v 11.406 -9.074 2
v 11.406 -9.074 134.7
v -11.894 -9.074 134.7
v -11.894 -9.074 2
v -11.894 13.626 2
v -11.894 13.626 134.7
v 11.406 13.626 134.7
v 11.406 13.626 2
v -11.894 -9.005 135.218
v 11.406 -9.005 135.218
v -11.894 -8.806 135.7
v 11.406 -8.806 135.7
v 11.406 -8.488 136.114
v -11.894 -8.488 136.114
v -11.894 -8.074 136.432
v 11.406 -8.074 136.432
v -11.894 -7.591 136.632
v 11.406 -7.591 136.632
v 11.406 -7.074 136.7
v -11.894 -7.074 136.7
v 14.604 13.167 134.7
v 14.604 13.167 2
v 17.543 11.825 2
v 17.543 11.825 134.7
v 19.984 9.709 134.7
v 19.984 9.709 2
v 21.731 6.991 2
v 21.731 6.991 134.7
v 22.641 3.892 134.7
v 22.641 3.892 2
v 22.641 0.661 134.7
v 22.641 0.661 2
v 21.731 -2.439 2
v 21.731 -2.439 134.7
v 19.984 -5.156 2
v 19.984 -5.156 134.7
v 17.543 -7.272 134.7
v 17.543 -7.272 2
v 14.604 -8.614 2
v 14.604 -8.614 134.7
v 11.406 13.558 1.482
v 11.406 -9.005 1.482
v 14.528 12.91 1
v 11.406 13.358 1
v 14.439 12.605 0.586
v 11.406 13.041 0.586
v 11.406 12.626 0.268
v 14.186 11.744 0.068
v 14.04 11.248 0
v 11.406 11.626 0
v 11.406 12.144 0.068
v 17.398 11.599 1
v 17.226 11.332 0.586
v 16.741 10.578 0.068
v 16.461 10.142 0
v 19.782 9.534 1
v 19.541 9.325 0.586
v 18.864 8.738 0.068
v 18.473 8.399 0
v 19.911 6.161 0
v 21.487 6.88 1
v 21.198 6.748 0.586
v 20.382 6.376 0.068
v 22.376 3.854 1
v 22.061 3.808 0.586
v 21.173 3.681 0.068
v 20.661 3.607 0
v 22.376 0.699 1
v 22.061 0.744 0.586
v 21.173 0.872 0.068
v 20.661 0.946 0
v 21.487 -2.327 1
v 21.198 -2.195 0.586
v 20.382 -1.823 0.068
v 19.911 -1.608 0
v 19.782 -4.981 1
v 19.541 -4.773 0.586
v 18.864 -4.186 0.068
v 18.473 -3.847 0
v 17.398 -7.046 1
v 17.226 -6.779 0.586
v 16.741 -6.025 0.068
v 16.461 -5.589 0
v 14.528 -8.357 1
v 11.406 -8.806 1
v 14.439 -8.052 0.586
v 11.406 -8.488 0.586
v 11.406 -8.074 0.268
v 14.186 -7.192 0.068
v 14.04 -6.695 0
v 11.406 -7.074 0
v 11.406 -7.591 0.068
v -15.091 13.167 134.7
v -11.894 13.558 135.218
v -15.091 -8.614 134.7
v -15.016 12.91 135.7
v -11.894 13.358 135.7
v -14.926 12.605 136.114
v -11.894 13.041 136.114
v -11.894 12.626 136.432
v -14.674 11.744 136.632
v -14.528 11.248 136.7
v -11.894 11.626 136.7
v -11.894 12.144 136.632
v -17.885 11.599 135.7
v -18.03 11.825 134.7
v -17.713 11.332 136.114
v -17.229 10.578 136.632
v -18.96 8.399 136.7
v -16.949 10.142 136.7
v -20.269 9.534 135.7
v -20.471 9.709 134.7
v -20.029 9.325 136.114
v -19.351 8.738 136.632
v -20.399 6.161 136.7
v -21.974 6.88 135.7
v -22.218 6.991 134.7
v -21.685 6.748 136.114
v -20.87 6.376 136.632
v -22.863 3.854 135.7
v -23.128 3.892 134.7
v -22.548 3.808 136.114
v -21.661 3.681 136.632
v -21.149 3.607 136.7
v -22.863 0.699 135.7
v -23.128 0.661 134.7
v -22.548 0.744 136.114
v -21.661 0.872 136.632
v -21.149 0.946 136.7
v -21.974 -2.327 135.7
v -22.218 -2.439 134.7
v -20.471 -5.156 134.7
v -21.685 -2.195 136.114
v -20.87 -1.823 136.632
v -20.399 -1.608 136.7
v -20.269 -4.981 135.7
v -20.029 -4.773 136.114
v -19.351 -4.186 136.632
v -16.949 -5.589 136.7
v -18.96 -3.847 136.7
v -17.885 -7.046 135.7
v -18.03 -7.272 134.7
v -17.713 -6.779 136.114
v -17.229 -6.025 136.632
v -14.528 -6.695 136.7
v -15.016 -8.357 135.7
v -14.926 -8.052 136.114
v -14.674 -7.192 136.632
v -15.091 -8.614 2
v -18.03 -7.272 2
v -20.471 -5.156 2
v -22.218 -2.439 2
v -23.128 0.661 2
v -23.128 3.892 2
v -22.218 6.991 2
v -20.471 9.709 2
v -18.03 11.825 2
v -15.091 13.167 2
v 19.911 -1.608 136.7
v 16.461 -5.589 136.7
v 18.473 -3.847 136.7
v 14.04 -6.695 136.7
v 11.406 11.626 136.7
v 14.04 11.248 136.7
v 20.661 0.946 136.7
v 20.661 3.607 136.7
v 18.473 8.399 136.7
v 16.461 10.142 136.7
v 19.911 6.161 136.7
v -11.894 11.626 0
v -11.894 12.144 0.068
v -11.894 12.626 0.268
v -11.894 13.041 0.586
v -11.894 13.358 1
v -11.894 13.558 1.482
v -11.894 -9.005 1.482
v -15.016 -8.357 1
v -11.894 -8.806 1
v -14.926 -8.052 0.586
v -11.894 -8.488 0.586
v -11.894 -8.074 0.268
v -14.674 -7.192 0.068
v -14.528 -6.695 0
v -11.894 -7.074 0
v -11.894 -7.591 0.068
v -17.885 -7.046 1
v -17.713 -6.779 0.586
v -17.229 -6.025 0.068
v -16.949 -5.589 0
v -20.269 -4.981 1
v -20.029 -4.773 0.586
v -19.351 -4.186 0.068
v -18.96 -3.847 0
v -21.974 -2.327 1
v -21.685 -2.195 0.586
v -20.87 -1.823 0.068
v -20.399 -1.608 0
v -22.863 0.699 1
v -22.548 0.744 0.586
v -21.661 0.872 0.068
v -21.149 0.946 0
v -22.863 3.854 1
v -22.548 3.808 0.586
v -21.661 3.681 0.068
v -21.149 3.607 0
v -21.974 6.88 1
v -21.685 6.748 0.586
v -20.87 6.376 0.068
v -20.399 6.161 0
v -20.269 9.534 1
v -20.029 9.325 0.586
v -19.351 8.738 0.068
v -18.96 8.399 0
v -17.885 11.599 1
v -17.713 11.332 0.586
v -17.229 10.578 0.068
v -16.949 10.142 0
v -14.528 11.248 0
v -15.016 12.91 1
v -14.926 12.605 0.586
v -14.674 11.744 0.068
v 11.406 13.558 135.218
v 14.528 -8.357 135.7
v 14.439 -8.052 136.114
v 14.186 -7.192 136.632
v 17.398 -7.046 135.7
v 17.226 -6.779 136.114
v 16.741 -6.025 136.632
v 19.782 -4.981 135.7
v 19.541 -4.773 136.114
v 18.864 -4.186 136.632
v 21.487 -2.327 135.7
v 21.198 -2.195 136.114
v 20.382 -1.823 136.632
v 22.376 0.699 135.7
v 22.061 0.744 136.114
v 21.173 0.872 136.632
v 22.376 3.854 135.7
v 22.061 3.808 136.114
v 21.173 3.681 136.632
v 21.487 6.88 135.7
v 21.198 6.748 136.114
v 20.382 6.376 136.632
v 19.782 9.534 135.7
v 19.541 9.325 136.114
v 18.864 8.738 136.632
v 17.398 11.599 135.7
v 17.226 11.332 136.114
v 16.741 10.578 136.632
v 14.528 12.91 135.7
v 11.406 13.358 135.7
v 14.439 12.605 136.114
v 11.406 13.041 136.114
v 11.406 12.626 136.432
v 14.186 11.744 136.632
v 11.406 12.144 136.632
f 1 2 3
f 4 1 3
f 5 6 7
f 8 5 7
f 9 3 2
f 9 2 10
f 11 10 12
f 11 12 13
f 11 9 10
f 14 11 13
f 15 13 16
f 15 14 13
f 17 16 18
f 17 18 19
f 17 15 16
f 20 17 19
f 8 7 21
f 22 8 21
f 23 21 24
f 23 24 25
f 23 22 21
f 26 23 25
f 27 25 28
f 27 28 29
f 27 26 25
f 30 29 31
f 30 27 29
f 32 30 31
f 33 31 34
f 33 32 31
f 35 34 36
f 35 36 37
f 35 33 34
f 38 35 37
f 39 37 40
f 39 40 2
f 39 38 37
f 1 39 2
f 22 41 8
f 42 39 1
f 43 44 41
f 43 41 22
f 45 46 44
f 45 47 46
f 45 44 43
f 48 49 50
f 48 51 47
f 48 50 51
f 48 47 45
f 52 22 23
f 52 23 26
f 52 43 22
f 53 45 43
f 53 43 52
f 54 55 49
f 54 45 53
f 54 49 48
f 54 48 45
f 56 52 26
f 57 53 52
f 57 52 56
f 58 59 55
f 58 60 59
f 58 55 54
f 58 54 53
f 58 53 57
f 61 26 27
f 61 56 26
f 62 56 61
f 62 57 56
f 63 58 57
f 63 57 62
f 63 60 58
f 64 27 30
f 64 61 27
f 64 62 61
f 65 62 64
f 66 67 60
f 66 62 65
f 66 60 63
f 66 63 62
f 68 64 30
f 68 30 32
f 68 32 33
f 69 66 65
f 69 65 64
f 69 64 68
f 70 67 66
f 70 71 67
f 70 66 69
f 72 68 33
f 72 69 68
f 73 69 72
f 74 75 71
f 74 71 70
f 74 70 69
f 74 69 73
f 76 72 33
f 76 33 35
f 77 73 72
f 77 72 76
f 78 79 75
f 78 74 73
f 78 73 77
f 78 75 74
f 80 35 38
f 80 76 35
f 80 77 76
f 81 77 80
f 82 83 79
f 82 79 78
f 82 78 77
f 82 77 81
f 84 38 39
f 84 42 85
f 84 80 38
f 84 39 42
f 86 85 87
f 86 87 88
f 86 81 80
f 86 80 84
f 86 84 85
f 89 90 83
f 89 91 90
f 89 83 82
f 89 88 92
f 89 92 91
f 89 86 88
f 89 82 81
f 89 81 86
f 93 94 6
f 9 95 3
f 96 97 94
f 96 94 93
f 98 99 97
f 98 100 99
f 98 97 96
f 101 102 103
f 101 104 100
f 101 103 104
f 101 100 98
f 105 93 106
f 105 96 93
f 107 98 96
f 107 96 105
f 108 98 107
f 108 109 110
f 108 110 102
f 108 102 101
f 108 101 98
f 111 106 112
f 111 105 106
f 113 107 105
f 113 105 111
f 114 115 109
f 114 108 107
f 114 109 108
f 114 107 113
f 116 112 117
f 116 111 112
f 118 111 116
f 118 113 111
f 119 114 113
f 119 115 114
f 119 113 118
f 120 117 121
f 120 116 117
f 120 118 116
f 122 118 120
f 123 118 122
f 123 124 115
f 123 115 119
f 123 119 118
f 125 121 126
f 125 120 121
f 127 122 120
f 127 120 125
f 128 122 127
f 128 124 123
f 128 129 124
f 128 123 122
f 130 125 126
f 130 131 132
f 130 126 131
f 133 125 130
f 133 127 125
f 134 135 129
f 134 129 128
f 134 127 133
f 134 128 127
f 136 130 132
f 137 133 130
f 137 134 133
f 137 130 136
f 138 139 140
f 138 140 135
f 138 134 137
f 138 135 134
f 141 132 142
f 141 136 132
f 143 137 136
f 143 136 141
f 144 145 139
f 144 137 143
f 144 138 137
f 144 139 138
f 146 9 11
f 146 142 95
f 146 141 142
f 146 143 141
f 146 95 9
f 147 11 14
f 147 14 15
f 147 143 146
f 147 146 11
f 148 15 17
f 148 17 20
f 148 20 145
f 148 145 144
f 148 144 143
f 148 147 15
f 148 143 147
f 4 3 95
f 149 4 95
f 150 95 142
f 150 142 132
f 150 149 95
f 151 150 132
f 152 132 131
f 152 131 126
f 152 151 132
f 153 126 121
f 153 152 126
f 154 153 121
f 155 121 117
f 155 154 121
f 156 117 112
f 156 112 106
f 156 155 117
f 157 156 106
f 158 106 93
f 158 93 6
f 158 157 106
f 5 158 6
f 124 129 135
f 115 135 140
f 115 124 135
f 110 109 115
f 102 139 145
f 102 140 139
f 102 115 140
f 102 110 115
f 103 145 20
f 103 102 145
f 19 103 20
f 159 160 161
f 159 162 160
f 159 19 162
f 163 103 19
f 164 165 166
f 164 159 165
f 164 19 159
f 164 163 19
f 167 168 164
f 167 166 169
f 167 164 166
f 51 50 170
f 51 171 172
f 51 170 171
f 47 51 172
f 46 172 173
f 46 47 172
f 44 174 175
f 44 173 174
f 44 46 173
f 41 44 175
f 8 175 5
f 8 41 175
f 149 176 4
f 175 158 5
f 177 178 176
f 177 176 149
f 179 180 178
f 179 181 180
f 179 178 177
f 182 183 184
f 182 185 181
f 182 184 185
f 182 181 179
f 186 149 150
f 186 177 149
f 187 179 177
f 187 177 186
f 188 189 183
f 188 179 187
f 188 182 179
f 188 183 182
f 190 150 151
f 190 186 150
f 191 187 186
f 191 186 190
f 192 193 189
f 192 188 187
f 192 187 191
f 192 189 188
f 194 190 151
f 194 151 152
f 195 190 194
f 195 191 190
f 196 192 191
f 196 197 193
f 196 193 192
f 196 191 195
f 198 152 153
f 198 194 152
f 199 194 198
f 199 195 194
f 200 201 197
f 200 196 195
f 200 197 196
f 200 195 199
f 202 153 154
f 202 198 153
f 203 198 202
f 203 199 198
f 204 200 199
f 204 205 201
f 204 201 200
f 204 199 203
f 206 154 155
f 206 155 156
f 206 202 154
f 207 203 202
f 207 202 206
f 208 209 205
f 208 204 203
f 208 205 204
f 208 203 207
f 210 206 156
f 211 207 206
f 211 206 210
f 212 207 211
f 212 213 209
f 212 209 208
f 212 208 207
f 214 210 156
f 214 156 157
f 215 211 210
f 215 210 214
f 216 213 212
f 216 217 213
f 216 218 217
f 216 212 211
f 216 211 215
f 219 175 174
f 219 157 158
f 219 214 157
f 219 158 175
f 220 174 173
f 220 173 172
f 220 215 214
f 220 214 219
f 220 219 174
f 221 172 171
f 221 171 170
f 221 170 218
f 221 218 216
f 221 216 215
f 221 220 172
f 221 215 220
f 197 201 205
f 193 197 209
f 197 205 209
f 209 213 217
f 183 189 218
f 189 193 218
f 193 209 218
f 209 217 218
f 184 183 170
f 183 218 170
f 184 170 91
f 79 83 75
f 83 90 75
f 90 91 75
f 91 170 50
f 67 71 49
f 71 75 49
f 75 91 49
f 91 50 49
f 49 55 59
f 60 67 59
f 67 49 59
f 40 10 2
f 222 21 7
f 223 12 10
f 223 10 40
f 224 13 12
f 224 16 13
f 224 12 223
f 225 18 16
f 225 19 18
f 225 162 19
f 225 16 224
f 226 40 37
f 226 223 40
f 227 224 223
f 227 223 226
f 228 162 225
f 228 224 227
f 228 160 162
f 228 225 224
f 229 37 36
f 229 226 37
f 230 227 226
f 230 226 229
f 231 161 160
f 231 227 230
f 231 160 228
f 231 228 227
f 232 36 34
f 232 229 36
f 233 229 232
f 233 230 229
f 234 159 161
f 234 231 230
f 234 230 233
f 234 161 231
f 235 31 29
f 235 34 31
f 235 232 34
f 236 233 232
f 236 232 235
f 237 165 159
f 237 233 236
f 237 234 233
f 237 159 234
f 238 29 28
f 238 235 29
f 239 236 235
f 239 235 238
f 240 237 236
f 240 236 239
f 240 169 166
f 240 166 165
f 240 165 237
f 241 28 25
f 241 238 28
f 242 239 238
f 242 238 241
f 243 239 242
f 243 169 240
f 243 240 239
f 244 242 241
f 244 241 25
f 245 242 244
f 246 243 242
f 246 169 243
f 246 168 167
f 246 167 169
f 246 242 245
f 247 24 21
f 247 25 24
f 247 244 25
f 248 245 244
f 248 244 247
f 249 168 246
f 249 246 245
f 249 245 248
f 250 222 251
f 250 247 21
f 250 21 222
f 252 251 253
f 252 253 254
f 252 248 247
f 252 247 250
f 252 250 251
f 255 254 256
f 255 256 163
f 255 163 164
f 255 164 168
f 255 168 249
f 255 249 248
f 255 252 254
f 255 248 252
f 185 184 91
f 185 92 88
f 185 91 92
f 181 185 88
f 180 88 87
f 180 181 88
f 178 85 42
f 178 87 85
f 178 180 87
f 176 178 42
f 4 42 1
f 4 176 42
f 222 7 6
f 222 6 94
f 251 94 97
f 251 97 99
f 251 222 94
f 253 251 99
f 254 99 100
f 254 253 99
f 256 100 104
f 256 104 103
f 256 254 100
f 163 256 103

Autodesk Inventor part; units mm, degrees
ref_plane "YZ Plane" through (0, 0, 0) normal (1, 0, 0) x (0, 1, 0)
ref_plane "XZ Plane" through (0, 0, 0) normal (0, 1, 0) x (-1, 0, 0)
ref_plane "XY Plane" through (0, 0, 0) normal (0, 0, 1) x (1, 0, 0)
sketch "スケッチ1" plane through (0, 0, 0) normal (0, 0, 1) x (1, 0, 0)
  line L0 (-11.8937, 2.2764) -> (11.4063, 2.2764) construction
  line L1 (-11.8937, 13.6264) -> (11.4063, 13.6264)
  line L2 (11.4063, -9.0736) -> (-11.8937, -9.0736)
  arc A0 (-11.8937, 13.6264) -> (-11.8937, -9.0736) centre (-11.8937, 2.2764) ccw
  arc A1 (11.4063, -9.0736) -> (11.4063, 13.6264) centre (11.4063, 2.2764) ccw
  point P0 (0, 0)
  point P1 (-0.2437, 2.2764)
  dimension "d0" = 46
  dimension "d1" = 22.7
extrude "押し出し1" add sketch "スケッチ1" along normal blind 136.7
fillet "フィレット1" radius 2 8 edges at (-0.2437, 13.6264, 136.7) (-23.2437, 2.2764, 136.7) (-0.2437, -9.0736, 136.7) (22.7563, 2.2764, 136.7) (-0.2437, -9.0736, 0) (-23.2437, 2.2764, 0) (-0.2437, 13.6264, 0) (22.7563, 2.2764, 0)
properties part number "バッテリー"
